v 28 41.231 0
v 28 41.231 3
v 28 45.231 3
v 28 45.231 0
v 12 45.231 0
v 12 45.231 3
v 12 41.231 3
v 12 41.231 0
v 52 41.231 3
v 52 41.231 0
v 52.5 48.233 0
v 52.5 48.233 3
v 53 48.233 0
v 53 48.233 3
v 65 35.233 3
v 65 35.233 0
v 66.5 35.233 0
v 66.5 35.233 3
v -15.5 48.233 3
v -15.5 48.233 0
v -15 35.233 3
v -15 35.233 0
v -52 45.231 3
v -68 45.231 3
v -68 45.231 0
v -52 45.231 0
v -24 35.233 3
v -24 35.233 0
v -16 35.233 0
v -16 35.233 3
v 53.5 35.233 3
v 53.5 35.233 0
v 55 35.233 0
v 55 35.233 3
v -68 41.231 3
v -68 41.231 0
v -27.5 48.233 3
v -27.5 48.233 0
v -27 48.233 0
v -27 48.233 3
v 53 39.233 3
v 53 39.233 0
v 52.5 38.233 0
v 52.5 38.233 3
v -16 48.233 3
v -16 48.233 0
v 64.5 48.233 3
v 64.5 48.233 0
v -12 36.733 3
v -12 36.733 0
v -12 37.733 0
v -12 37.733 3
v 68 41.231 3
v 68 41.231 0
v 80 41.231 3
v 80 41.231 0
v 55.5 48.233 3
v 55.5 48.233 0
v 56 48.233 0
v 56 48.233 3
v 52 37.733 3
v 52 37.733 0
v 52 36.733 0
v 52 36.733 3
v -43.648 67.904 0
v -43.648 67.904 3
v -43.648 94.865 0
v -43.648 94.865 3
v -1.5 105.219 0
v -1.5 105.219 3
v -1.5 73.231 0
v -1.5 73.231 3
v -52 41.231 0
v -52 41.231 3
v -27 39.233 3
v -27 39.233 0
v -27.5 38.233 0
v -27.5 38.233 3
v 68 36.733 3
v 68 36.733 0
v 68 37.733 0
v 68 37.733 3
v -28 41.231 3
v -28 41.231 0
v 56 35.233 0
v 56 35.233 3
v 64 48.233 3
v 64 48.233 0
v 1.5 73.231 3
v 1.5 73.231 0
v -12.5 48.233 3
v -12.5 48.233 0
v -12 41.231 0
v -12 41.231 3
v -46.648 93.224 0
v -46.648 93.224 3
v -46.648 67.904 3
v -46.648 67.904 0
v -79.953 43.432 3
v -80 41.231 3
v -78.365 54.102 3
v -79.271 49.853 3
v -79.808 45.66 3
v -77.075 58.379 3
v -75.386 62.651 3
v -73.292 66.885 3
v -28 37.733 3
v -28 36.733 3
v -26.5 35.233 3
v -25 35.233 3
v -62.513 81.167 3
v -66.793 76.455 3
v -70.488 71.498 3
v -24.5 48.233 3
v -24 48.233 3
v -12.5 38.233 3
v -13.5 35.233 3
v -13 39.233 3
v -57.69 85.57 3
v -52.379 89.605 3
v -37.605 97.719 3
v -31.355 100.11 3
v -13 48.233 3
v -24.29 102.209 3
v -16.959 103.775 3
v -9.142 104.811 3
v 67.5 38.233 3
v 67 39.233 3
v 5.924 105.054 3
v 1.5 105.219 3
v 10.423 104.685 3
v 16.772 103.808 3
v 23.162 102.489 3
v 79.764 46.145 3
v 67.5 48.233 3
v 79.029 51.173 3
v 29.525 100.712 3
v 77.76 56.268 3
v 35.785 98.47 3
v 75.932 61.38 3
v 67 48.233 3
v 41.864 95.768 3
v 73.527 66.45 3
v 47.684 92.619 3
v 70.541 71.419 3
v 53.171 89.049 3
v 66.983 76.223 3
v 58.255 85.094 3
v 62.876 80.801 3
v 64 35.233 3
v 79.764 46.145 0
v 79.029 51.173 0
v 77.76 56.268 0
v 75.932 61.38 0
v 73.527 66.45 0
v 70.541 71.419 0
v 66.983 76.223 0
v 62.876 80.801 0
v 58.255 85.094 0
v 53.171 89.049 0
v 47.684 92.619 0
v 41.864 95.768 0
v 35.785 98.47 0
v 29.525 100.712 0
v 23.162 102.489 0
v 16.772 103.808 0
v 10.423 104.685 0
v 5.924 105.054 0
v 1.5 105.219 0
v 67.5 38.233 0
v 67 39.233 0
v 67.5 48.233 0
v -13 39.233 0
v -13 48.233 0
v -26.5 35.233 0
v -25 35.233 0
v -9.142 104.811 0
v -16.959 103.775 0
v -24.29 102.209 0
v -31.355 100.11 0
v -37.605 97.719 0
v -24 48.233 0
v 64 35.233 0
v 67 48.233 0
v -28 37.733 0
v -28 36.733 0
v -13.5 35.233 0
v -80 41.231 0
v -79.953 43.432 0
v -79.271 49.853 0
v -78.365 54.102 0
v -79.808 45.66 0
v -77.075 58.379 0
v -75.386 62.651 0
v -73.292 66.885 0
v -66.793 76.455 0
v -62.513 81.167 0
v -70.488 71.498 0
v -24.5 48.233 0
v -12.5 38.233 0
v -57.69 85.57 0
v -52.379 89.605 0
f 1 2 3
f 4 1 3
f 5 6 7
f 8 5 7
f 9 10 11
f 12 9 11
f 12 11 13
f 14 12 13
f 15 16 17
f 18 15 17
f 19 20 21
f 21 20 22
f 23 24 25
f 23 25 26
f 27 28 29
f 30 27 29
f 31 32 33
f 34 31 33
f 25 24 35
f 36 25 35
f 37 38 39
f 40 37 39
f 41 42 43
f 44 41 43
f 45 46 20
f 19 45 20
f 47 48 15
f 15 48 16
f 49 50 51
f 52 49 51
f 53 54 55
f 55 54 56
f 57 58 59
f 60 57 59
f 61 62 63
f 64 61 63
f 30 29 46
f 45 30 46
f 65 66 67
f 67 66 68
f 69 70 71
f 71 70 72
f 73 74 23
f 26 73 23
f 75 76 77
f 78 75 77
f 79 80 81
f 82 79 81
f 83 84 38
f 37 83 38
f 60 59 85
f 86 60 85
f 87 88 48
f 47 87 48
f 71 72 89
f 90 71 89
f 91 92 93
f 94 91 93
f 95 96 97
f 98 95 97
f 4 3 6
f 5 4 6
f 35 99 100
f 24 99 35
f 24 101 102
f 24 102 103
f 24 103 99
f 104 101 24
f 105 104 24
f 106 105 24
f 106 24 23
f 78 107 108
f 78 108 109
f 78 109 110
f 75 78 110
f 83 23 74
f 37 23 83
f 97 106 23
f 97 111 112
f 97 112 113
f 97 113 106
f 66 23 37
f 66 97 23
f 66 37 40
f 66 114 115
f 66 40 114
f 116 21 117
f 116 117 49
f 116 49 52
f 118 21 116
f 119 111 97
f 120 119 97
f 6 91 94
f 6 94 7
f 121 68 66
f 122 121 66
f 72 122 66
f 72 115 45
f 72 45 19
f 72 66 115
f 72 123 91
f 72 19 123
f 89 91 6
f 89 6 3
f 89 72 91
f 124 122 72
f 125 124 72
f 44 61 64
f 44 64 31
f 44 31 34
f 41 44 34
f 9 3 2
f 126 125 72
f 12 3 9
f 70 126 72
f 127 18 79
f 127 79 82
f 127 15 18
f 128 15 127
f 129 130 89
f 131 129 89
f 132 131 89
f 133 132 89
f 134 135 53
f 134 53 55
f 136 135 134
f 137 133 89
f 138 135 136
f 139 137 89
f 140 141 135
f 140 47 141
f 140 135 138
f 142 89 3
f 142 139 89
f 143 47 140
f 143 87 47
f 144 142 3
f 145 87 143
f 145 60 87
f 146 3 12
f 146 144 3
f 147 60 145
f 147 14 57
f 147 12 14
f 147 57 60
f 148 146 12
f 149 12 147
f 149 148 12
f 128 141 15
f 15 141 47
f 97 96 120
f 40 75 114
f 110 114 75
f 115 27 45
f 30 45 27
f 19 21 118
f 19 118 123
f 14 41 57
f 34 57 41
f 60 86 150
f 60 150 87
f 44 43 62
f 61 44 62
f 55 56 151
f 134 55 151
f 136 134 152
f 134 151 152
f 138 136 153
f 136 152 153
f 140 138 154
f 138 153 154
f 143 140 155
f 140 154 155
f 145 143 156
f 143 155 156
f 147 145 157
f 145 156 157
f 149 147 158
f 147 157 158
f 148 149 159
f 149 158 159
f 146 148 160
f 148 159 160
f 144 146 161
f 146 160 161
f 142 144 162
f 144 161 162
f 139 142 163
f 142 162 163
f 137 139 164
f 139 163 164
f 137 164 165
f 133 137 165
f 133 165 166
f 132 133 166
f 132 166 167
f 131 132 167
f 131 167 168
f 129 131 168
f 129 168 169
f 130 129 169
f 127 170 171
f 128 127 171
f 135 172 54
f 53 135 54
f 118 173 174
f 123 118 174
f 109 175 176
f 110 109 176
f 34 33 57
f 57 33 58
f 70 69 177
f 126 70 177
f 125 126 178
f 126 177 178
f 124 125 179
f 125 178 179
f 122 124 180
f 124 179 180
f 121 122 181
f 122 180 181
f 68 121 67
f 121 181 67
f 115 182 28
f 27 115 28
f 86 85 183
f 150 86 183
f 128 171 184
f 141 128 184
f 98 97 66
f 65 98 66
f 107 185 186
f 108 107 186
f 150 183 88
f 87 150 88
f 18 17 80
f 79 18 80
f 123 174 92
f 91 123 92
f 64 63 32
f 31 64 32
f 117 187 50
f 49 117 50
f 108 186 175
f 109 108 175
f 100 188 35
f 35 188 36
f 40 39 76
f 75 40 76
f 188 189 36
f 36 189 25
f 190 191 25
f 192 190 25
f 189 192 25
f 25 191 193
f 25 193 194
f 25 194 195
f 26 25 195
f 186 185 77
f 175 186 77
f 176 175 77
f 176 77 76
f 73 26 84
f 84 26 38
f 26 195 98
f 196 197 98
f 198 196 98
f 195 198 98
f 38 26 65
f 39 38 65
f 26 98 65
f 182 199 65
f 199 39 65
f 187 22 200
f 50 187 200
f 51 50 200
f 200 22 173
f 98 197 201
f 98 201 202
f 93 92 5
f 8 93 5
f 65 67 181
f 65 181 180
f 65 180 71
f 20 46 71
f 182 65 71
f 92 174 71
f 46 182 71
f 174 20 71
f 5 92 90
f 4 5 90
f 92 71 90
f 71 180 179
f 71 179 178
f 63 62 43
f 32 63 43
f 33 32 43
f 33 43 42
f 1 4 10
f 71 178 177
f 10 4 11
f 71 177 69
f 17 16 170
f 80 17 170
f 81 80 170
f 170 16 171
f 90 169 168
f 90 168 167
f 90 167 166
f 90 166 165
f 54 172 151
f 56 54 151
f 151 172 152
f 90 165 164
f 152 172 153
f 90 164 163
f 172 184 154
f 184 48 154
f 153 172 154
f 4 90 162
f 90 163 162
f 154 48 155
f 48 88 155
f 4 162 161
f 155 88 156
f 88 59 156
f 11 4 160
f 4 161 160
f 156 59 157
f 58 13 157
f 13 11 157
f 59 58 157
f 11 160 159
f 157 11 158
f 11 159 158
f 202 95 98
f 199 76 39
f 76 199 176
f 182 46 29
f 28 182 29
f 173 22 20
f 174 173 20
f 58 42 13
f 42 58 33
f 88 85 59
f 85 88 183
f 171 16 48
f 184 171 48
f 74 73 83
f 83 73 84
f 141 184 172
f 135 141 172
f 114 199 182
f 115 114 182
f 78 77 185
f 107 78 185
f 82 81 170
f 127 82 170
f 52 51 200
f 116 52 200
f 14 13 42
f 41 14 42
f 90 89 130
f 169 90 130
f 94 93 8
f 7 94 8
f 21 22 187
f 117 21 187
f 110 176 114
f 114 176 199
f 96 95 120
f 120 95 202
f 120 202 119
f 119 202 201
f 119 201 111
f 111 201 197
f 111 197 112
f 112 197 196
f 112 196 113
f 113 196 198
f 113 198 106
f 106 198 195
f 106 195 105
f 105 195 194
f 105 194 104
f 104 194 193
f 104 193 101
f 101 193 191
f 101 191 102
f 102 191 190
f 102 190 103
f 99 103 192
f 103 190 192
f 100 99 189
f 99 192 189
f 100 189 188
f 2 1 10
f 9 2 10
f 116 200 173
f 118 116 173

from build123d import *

# Parameters (mm, degrees)
BOSS_EXTRUDE1_DEPTH     = 3
CUT_EXTRUDE1_DEPTH      = 1.0000001
CUT_EXTRUDE1_DEPTH_BACK = 3
CUT_EXTRUDE2_DEPTH      = 1.0000001
CUT_EXTRUDE2_DEPTH_BACK = 3
CUT_EXTRUDE3_DEPTH      = 1.0000001
CUT_EXTRUDE3_DEPTH_BACK = 3
CUT_EXTRUDE4_DEPTH      = 1.0000001
CUT_EXTRUDE4_DEPTH_BACK = 3


with BuildPart() as part:
    # Sketch1 → Boss-Extrude1 (new body)
    with BuildSketch(Plane.XY):
        with BuildLine():
            Line((-80, 41.231056256), (-28, 41.231056256))
            Line((-28, 41.231056256), (-27.5, 48.233227348))
            Line((-27.5, 48.233227348), (-27, 48.233227348))
            Line((-27, 48.233227348), (-27, 39.233227348))
            Line((-27, 39.233227348), (-27.5, 38.233227348))
            Line((-27.5, 38.233227348), (-28, 37.733227348))
            Line((-28, 37.733227348), (-28, 36.733227348))
            Line((-28, 36.733227348), (-26.5, 35.233227348))
            Line((-26.5, 35.233227348), (-25, 35.233227348))
            Line((-25, 35.233227348), (-24.5, 48.233227348))
            Line((-24.5, 48.233227348), (-24, 48.233227348))
            Line((-24, 48.233227348), (-24, 35.233227348))
            Line((-24, 35.233227348), (-16, 35.233227348))
            Line((-16, 35.233227348), (-16, 48.233227348))
            Line((-16, 48.233227348), (-15.5, 48.233227348))
            Line((-15.5, 48.233227348), (-15, 35.233227348))
            Line((-15, 35.233227348), (-13.5, 35.233227348))
            Line((-13.5, 35.233227348), (-12, 36.733227348))
            Line((-12, 36.733227348), (-12, 37.733227348))
            Line((-12, 37.733227348), (-12.5, 38.233227348))
            Line((-12.5, 38.233227348), (-13, 39.233227348))
            Line((-13, 39.233227348), (-13, 48.233227348))
            Line((-13, 48.233227348), (-12.5, 48.233227348))
            Line((-12.5, 48.233227348), (-12, 41.231056256))
            Line((-12, 41.231056256), (52, 41.231056256))
            Line((52, 41.231056256), (52.5, 48.233227348))
            Line((52.5, 48.233227348), (53, 48.233227348))
            Line((53, 48.233227348), (53, 39.233227348))
            Line((53, 39.233227348), (52.5, 38.233227348))
            Line((52.5, 38.233227348), (52, 37.733227348))
            Line((52, 37.733227348), (52, 36.733227348))
            Line((52, 36.733227348), (53.5, 35.233227348))
            Line((53.5, 35.233227348), (55, 35.233227348))
            Line((55, 35.233227348), (55.5, 48.233227348))
            Line((55.5, 48.233227348), (56, 48.233227348))
            Line((56, 48.233227348), (56, 35.233227348))
            Line((56, 35.233227348), (64, 35.233227348))
            Line((64, 35.233227348), (64, 48.233227348))
            Line((64, 48.233227348), (64.5, 48.233227348))
            Line((64.5, 48.233227348), (65, 35.233227348))
            Line((65, 35.233227348), (66.5, 35.233227348))
            Line((66.5, 35.233227348), (68, 36.733227348))
            Line((68, 36.733227348), (68, 37.733227348))
            Line((68, 37.733227348), (67.5, 38.233227348))
            Line((67.5, 38.233227348), (67, 39.233227348))
            Line((67, 39.233227348), (67, 48.233227348))
            Line((67, 48.233227348), (67.5, 48.233227348))
            Line((67.5, 48.233227348), (68, 41.231056256))
            Line((68, 41.231056256), (80, 41.231056256))
            add(Edge.make_bspline(
                [(80, 41.231056256), (80, 105.23), (0, 105.23)],
                knots=[0, 0, 0, 1.570796327, 1.570796327, 1.570796327], degree=2, weights=[1, 0.707106781, 1]))
            add(Edge.make_bspline(
                [(0, 105.23), (-80, 105.23), (-80, 41.231056256)],
                knots=[1.570796327, 1.570796327, 1.570796327, 3.141592654, 3.141592654, 3.141592654], degree=2, weights=[1, 0.707106781, 1]))
        make_face()
    extrude(amount=BOSS_EXTRUDE1_DEPTH)

    # Sketch8 → Cut-Extrude1 (cut, two sides)
    with BuildSketch(Plane.XY.offset(3)) as cut_extrude1_sk:
        Polygon((-68, -291.258415465), (-68, 41.231056256), (-68, 45.231056256), (-52, 45.231056256), (-52, 41.231056256), (-52, -291.258415465), (-52, -956.237358907), (-68, -956.237358907), align=None)
    extrude(amount=CUT_EXTRUDE1_DEPTH, mode=Mode.SUBTRACT)
    extrude(cut_extrude1_sk.sketch, amount=-CUT_EXTRUDE1_DEPTH_BACK, mode=Mode.SUBTRACT)

    # Sketch9 → Cut-Extrude2 (cut, two sides)
    with BuildSketch(Plane.XY.offset(3)) as cut_extrude2_sk:
        Polygon((28, -219.845544284), (28, 41.231056256), (28, 45.231056256), (12, 45.231056256), (12, 41.231056256), (12, -219.845544284), (12, -741.998745365), (28, -741.998745365), align=None)
    extrude(amount=CUT_EXTRUDE2_DEPTH, mode=Mode.SUBTRACT)
    extrude(cut_extrude2_sk.sketch, amount=-CUT_EXTRUDE2_DEPTH_BACK, mode=Mode.SUBTRACT)

    # Sketch10 → Cut-Extrude3 (cut, two sides)
    with BuildSketch(Plane.XY.offset(3)) as cut_extrude3_sk:
        Polygon((-1.500000233, 330.069612224), (-1.500000233, 105.218749193), (-1.500000233, 73.231), (1.499999767, 73.231), (1.499999767, 105.2187492), (1.499999767, 330.069612231), (1.499998719, 779.771338291), (-1.500001281, 779.771338284), align=None)
    extrude(amount=CUT_EXTRUDE3_DEPTH, mode=Mode.SUBTRACT)
    extrude(cut_extrude3_sk.sketch, amount=-CUT_EXTRUDE3_DEPTH_BACK, mode=Mode.SUBTRACT)

    # Sketch11 → Cut-Extrude4 (cut, two sides)
    with BuildSketch(Plane.XY.offset(3)) as cut_extrude4_sk:
        Polygon((-46.64838896, 381.810733149), (-46.64838896, 93.22359963), (-46.64838896, 67.904187559), (-43.64838896, 67.904187559), (-43.64838896, 94.864894992), (-43.64838896, 383.452028511), (-320.670818857, 889.800434121), (-323.670818857, 888.159138759), align=None)
    extrude(amount=CUT_EXTRUDE4_DEPTH, mode=Mode.SUBTRACT)
    extrude(cut_extrude4_sk.sketch, amount=-CUT_EXTRUDE4_DEPTH_BACK, mode=Mode.SUBTRACT)


solid = part.part
